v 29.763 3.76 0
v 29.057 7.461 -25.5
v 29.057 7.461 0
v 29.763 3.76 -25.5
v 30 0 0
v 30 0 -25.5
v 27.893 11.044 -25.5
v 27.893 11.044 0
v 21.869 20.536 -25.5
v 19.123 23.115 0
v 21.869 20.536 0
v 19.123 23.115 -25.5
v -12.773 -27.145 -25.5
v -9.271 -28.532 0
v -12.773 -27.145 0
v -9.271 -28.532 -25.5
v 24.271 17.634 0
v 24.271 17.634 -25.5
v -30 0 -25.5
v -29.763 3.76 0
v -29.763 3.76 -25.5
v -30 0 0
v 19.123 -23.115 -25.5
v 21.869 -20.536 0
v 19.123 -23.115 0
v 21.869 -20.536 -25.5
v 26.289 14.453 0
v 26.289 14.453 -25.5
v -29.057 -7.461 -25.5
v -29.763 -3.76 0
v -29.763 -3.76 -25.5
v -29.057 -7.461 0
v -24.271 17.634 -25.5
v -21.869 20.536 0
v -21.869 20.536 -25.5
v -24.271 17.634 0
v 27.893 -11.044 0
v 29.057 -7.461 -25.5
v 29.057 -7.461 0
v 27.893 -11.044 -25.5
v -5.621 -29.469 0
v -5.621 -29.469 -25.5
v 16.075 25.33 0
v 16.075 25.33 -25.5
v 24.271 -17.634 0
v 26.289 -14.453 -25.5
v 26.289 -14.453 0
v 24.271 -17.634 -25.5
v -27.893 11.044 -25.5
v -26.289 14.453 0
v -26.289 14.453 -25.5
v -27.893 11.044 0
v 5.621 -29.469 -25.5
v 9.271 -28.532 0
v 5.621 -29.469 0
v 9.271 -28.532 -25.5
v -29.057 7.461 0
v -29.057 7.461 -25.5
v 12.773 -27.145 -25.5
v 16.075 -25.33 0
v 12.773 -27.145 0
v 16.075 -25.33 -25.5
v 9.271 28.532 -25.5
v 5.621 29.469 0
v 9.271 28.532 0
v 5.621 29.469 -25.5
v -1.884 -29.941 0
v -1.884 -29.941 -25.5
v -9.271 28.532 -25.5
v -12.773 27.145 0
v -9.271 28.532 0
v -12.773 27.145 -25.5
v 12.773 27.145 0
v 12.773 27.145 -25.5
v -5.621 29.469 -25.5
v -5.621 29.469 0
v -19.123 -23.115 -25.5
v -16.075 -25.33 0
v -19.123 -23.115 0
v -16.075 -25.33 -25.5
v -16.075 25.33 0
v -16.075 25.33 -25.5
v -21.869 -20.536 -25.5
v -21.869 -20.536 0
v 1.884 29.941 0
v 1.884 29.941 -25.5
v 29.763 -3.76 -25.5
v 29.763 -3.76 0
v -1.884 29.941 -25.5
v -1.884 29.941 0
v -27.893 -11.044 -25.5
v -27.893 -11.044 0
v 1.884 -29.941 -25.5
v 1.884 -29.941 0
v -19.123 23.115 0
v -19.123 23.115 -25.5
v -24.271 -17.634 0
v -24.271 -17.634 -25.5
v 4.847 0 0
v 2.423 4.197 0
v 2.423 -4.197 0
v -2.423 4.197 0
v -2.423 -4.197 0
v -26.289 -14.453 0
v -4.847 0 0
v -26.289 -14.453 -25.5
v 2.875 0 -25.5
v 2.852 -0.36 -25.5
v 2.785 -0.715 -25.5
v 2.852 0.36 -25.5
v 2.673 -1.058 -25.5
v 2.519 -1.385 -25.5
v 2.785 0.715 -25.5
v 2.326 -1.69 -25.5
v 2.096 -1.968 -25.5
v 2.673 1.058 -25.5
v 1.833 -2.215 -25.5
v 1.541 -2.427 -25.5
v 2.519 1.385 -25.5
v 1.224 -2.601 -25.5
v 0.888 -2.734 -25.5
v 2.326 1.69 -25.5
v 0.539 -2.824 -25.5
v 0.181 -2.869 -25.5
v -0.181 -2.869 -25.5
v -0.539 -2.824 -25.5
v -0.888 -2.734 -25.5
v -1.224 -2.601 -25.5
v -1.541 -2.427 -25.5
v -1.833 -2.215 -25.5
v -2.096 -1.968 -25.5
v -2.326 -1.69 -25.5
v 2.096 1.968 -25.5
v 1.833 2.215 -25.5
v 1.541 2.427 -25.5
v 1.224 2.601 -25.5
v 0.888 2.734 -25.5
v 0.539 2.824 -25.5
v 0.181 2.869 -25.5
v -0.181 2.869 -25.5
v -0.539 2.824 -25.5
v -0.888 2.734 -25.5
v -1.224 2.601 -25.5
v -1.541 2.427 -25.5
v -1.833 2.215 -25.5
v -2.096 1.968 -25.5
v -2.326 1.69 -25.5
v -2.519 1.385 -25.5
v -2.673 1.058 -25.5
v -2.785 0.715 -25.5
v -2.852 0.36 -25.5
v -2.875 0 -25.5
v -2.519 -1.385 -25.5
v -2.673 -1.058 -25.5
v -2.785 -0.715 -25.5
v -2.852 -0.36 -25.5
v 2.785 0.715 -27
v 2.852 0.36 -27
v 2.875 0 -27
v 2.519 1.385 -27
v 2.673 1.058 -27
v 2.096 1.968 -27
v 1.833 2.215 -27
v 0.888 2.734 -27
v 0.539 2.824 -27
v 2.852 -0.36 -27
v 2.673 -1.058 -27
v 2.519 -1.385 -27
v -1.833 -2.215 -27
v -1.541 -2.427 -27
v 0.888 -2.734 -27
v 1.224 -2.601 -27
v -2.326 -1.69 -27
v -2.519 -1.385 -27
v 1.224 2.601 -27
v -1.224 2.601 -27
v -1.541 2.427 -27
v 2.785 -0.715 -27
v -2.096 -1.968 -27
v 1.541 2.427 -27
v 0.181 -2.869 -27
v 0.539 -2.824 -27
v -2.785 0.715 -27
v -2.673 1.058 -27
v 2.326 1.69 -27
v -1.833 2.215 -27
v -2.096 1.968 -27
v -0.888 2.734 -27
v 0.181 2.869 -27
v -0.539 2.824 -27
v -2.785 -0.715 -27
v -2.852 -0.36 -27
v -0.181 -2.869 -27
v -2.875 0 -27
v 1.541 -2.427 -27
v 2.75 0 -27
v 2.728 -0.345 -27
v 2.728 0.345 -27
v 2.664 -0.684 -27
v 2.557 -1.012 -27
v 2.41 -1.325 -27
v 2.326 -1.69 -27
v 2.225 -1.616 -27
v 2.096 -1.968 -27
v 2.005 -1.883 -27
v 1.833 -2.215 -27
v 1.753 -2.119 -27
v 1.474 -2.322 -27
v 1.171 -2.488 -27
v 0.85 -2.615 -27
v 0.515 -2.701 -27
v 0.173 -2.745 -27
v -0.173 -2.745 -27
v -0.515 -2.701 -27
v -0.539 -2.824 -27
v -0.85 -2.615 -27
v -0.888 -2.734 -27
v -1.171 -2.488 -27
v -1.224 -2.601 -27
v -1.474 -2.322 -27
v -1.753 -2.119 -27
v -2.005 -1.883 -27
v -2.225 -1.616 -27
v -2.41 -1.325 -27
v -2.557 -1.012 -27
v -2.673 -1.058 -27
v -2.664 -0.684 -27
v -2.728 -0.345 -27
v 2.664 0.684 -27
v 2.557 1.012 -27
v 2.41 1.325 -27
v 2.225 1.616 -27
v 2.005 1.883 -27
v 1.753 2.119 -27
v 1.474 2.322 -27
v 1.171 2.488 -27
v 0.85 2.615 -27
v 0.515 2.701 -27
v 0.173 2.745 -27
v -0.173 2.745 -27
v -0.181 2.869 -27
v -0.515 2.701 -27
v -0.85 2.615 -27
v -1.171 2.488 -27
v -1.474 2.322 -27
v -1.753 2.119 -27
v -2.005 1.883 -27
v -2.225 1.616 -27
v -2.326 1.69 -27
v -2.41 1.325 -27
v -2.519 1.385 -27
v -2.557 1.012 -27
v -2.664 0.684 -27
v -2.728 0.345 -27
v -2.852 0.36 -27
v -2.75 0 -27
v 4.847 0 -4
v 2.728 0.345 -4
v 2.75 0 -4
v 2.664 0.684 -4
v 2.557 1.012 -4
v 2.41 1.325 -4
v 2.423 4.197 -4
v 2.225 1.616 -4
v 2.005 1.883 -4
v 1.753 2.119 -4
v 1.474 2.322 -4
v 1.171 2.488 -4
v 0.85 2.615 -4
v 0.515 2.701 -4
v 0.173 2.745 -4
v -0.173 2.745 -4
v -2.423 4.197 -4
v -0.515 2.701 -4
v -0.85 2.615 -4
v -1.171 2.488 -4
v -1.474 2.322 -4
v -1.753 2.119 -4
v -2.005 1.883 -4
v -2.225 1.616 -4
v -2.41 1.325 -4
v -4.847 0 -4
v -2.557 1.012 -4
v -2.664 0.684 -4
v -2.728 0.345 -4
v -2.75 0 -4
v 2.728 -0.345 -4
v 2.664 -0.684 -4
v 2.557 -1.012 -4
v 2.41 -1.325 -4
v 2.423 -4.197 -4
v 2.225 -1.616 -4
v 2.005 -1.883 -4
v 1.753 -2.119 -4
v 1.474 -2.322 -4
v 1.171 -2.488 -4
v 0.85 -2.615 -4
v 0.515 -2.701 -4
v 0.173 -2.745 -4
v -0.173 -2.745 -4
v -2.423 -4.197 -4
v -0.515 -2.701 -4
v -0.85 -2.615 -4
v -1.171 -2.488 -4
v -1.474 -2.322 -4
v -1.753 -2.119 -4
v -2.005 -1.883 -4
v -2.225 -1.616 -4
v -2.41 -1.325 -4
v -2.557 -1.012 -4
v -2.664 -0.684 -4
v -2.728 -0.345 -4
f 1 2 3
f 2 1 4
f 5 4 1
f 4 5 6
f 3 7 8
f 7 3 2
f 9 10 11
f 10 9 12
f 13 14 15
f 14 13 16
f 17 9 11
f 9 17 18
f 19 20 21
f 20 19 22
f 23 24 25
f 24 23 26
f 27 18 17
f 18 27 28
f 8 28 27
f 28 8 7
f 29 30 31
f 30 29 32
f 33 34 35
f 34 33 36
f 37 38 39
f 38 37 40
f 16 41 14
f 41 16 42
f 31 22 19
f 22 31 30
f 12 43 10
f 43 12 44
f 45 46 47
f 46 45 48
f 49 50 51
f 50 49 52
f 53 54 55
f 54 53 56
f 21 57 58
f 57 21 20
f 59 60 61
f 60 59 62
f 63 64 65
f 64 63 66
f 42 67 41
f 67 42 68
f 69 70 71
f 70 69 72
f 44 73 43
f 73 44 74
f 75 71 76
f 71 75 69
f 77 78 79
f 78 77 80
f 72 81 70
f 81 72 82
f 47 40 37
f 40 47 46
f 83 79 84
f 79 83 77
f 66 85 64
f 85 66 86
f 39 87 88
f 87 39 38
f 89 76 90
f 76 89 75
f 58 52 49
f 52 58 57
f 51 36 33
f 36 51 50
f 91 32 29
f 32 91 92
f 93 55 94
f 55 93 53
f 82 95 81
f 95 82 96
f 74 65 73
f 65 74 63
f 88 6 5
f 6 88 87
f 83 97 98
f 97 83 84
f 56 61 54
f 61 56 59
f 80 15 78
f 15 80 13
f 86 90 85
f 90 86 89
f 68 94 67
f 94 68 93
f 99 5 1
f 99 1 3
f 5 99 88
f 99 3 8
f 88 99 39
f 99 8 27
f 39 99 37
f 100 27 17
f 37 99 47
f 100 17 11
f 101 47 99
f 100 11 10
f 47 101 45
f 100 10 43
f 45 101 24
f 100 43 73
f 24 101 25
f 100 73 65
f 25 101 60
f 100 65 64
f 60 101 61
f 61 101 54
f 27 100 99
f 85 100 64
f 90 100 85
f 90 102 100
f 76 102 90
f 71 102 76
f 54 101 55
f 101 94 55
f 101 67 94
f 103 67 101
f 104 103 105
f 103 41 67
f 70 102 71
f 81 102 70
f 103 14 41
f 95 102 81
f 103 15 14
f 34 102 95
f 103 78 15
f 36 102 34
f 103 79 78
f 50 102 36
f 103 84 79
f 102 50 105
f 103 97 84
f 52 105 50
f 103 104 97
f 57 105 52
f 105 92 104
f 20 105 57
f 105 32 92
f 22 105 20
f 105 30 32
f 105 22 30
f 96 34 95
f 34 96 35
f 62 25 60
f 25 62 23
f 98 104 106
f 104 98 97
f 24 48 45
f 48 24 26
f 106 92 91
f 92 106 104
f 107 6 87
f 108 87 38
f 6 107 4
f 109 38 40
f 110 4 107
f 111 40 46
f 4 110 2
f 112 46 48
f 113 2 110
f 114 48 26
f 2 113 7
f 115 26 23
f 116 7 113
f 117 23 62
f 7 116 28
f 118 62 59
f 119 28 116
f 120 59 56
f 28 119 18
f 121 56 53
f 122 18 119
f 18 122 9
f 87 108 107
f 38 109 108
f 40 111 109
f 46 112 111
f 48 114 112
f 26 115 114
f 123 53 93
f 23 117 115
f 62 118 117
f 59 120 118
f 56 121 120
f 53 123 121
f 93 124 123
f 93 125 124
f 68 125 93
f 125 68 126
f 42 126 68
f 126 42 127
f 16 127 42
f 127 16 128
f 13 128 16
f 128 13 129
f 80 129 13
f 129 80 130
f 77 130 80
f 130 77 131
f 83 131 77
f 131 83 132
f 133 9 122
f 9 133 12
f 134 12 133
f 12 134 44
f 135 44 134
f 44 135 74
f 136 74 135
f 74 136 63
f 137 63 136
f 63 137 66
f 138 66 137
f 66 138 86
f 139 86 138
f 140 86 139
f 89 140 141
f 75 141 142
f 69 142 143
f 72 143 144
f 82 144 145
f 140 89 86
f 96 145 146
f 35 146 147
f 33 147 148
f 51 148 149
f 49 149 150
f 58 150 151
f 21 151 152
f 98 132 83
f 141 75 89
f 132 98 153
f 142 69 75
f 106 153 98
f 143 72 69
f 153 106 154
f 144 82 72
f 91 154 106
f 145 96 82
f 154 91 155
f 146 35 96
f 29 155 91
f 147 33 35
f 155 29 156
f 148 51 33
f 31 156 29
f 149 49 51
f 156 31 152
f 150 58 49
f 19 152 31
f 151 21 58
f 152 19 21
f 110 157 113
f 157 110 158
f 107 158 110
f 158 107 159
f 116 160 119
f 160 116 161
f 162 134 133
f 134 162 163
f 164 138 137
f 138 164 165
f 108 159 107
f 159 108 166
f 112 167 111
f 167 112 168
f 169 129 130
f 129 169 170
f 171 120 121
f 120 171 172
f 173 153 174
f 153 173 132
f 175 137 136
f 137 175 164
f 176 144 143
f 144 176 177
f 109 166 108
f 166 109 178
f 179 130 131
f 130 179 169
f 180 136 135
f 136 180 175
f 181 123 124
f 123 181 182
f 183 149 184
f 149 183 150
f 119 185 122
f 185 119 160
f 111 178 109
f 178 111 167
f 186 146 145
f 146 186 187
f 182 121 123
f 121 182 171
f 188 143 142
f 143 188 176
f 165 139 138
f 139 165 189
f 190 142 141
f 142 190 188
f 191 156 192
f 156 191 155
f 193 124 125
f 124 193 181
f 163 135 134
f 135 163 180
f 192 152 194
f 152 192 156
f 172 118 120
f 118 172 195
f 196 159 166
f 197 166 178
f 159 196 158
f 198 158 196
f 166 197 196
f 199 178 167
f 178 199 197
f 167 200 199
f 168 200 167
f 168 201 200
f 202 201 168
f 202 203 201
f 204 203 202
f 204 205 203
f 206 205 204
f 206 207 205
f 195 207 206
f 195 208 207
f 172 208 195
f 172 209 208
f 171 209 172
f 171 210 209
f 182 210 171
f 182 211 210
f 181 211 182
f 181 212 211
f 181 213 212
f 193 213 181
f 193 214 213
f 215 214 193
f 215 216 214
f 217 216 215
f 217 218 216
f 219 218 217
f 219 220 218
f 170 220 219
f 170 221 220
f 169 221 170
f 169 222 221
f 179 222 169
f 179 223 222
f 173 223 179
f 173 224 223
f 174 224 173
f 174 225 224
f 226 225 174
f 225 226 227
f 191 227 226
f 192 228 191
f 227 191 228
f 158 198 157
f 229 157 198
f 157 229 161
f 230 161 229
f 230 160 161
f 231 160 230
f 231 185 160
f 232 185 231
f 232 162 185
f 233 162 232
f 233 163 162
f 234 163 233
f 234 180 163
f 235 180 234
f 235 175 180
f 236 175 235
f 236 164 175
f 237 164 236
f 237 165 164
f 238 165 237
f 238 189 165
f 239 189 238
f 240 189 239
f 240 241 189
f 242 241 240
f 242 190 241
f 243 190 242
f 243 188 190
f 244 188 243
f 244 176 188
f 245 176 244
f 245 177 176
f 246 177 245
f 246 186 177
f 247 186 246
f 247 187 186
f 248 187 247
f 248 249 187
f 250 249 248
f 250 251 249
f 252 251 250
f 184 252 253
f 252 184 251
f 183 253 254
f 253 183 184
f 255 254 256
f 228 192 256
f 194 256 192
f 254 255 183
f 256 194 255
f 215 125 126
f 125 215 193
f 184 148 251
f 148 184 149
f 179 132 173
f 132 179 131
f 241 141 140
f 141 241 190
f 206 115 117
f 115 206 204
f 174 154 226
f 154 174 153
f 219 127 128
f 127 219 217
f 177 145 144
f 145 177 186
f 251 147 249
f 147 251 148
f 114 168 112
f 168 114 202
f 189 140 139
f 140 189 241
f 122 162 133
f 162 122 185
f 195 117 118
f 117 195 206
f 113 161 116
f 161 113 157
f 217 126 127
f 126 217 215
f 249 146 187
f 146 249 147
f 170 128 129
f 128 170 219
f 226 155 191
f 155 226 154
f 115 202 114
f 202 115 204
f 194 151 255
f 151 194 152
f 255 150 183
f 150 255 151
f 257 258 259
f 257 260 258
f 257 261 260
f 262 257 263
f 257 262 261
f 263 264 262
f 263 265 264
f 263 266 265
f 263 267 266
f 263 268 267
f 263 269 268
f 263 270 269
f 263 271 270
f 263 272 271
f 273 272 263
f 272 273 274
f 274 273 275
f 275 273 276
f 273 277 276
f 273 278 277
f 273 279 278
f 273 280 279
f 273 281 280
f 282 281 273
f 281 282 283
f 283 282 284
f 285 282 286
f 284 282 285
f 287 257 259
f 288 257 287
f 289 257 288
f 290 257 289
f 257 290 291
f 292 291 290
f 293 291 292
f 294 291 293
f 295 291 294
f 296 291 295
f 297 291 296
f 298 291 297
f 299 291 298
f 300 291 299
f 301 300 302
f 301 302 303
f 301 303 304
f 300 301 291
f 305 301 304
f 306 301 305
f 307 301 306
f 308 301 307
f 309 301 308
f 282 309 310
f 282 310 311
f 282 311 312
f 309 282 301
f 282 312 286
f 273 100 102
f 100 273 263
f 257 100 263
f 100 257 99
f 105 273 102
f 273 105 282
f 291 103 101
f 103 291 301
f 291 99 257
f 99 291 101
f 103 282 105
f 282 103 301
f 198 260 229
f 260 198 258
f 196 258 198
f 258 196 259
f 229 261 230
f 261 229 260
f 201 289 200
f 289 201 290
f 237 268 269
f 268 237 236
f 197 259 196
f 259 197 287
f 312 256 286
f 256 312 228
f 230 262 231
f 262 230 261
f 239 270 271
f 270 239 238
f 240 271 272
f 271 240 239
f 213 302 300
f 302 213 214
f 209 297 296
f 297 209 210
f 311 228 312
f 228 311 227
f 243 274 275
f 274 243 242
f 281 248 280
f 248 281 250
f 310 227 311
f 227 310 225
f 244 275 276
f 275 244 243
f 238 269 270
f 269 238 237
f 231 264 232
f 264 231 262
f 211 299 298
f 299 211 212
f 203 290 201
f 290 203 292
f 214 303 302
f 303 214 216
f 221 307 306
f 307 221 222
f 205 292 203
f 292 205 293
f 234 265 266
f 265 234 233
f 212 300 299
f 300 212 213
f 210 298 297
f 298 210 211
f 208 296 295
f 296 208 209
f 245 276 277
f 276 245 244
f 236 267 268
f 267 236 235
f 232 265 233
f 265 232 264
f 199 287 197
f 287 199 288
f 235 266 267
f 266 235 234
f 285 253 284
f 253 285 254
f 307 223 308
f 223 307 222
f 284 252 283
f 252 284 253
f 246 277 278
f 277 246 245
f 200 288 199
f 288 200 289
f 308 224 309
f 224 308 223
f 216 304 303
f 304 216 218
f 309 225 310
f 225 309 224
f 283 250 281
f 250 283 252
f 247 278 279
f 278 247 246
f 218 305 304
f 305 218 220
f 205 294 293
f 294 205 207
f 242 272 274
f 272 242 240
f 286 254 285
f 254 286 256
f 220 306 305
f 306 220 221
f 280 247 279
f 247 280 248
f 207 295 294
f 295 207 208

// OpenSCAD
$fn = 50;


difference() {
	union() {
		translate(v = [0, 0, -25.5000000000]) {
			cylinder(h = 25.5000000000, r = 30.0000000000);
		}
		#translate(v = [0, 0, -27.0000000000]) {
			cylinder(h = 27, r = 2.8750000000);
		}
	}
	union() {
		translate(v = [0, 0, 0]) {
			rotate(a = [0, 0, 0]) {
				difference() {
					union() {
						translate(v = [0, 0, -4]) {
							linear_extrude(height = 4) {
								polygon(points = [[4.8468000000, 0.0000000000], [2.4234000000, 4.1974519271], [-2.4234000000, 4.1974519271], [-4.8468000000, 0.0000000000], [-2.4234000000, -4.1974519271], [2.4234000000, -4.1974519271]]);
							}
						}
					}
					union();
				}
			}
		}
		#translate(v = [0, 0, -100.0000000000]) {
			cylinder(h = 200, r = 2.7500000000);
		}
	}
}
